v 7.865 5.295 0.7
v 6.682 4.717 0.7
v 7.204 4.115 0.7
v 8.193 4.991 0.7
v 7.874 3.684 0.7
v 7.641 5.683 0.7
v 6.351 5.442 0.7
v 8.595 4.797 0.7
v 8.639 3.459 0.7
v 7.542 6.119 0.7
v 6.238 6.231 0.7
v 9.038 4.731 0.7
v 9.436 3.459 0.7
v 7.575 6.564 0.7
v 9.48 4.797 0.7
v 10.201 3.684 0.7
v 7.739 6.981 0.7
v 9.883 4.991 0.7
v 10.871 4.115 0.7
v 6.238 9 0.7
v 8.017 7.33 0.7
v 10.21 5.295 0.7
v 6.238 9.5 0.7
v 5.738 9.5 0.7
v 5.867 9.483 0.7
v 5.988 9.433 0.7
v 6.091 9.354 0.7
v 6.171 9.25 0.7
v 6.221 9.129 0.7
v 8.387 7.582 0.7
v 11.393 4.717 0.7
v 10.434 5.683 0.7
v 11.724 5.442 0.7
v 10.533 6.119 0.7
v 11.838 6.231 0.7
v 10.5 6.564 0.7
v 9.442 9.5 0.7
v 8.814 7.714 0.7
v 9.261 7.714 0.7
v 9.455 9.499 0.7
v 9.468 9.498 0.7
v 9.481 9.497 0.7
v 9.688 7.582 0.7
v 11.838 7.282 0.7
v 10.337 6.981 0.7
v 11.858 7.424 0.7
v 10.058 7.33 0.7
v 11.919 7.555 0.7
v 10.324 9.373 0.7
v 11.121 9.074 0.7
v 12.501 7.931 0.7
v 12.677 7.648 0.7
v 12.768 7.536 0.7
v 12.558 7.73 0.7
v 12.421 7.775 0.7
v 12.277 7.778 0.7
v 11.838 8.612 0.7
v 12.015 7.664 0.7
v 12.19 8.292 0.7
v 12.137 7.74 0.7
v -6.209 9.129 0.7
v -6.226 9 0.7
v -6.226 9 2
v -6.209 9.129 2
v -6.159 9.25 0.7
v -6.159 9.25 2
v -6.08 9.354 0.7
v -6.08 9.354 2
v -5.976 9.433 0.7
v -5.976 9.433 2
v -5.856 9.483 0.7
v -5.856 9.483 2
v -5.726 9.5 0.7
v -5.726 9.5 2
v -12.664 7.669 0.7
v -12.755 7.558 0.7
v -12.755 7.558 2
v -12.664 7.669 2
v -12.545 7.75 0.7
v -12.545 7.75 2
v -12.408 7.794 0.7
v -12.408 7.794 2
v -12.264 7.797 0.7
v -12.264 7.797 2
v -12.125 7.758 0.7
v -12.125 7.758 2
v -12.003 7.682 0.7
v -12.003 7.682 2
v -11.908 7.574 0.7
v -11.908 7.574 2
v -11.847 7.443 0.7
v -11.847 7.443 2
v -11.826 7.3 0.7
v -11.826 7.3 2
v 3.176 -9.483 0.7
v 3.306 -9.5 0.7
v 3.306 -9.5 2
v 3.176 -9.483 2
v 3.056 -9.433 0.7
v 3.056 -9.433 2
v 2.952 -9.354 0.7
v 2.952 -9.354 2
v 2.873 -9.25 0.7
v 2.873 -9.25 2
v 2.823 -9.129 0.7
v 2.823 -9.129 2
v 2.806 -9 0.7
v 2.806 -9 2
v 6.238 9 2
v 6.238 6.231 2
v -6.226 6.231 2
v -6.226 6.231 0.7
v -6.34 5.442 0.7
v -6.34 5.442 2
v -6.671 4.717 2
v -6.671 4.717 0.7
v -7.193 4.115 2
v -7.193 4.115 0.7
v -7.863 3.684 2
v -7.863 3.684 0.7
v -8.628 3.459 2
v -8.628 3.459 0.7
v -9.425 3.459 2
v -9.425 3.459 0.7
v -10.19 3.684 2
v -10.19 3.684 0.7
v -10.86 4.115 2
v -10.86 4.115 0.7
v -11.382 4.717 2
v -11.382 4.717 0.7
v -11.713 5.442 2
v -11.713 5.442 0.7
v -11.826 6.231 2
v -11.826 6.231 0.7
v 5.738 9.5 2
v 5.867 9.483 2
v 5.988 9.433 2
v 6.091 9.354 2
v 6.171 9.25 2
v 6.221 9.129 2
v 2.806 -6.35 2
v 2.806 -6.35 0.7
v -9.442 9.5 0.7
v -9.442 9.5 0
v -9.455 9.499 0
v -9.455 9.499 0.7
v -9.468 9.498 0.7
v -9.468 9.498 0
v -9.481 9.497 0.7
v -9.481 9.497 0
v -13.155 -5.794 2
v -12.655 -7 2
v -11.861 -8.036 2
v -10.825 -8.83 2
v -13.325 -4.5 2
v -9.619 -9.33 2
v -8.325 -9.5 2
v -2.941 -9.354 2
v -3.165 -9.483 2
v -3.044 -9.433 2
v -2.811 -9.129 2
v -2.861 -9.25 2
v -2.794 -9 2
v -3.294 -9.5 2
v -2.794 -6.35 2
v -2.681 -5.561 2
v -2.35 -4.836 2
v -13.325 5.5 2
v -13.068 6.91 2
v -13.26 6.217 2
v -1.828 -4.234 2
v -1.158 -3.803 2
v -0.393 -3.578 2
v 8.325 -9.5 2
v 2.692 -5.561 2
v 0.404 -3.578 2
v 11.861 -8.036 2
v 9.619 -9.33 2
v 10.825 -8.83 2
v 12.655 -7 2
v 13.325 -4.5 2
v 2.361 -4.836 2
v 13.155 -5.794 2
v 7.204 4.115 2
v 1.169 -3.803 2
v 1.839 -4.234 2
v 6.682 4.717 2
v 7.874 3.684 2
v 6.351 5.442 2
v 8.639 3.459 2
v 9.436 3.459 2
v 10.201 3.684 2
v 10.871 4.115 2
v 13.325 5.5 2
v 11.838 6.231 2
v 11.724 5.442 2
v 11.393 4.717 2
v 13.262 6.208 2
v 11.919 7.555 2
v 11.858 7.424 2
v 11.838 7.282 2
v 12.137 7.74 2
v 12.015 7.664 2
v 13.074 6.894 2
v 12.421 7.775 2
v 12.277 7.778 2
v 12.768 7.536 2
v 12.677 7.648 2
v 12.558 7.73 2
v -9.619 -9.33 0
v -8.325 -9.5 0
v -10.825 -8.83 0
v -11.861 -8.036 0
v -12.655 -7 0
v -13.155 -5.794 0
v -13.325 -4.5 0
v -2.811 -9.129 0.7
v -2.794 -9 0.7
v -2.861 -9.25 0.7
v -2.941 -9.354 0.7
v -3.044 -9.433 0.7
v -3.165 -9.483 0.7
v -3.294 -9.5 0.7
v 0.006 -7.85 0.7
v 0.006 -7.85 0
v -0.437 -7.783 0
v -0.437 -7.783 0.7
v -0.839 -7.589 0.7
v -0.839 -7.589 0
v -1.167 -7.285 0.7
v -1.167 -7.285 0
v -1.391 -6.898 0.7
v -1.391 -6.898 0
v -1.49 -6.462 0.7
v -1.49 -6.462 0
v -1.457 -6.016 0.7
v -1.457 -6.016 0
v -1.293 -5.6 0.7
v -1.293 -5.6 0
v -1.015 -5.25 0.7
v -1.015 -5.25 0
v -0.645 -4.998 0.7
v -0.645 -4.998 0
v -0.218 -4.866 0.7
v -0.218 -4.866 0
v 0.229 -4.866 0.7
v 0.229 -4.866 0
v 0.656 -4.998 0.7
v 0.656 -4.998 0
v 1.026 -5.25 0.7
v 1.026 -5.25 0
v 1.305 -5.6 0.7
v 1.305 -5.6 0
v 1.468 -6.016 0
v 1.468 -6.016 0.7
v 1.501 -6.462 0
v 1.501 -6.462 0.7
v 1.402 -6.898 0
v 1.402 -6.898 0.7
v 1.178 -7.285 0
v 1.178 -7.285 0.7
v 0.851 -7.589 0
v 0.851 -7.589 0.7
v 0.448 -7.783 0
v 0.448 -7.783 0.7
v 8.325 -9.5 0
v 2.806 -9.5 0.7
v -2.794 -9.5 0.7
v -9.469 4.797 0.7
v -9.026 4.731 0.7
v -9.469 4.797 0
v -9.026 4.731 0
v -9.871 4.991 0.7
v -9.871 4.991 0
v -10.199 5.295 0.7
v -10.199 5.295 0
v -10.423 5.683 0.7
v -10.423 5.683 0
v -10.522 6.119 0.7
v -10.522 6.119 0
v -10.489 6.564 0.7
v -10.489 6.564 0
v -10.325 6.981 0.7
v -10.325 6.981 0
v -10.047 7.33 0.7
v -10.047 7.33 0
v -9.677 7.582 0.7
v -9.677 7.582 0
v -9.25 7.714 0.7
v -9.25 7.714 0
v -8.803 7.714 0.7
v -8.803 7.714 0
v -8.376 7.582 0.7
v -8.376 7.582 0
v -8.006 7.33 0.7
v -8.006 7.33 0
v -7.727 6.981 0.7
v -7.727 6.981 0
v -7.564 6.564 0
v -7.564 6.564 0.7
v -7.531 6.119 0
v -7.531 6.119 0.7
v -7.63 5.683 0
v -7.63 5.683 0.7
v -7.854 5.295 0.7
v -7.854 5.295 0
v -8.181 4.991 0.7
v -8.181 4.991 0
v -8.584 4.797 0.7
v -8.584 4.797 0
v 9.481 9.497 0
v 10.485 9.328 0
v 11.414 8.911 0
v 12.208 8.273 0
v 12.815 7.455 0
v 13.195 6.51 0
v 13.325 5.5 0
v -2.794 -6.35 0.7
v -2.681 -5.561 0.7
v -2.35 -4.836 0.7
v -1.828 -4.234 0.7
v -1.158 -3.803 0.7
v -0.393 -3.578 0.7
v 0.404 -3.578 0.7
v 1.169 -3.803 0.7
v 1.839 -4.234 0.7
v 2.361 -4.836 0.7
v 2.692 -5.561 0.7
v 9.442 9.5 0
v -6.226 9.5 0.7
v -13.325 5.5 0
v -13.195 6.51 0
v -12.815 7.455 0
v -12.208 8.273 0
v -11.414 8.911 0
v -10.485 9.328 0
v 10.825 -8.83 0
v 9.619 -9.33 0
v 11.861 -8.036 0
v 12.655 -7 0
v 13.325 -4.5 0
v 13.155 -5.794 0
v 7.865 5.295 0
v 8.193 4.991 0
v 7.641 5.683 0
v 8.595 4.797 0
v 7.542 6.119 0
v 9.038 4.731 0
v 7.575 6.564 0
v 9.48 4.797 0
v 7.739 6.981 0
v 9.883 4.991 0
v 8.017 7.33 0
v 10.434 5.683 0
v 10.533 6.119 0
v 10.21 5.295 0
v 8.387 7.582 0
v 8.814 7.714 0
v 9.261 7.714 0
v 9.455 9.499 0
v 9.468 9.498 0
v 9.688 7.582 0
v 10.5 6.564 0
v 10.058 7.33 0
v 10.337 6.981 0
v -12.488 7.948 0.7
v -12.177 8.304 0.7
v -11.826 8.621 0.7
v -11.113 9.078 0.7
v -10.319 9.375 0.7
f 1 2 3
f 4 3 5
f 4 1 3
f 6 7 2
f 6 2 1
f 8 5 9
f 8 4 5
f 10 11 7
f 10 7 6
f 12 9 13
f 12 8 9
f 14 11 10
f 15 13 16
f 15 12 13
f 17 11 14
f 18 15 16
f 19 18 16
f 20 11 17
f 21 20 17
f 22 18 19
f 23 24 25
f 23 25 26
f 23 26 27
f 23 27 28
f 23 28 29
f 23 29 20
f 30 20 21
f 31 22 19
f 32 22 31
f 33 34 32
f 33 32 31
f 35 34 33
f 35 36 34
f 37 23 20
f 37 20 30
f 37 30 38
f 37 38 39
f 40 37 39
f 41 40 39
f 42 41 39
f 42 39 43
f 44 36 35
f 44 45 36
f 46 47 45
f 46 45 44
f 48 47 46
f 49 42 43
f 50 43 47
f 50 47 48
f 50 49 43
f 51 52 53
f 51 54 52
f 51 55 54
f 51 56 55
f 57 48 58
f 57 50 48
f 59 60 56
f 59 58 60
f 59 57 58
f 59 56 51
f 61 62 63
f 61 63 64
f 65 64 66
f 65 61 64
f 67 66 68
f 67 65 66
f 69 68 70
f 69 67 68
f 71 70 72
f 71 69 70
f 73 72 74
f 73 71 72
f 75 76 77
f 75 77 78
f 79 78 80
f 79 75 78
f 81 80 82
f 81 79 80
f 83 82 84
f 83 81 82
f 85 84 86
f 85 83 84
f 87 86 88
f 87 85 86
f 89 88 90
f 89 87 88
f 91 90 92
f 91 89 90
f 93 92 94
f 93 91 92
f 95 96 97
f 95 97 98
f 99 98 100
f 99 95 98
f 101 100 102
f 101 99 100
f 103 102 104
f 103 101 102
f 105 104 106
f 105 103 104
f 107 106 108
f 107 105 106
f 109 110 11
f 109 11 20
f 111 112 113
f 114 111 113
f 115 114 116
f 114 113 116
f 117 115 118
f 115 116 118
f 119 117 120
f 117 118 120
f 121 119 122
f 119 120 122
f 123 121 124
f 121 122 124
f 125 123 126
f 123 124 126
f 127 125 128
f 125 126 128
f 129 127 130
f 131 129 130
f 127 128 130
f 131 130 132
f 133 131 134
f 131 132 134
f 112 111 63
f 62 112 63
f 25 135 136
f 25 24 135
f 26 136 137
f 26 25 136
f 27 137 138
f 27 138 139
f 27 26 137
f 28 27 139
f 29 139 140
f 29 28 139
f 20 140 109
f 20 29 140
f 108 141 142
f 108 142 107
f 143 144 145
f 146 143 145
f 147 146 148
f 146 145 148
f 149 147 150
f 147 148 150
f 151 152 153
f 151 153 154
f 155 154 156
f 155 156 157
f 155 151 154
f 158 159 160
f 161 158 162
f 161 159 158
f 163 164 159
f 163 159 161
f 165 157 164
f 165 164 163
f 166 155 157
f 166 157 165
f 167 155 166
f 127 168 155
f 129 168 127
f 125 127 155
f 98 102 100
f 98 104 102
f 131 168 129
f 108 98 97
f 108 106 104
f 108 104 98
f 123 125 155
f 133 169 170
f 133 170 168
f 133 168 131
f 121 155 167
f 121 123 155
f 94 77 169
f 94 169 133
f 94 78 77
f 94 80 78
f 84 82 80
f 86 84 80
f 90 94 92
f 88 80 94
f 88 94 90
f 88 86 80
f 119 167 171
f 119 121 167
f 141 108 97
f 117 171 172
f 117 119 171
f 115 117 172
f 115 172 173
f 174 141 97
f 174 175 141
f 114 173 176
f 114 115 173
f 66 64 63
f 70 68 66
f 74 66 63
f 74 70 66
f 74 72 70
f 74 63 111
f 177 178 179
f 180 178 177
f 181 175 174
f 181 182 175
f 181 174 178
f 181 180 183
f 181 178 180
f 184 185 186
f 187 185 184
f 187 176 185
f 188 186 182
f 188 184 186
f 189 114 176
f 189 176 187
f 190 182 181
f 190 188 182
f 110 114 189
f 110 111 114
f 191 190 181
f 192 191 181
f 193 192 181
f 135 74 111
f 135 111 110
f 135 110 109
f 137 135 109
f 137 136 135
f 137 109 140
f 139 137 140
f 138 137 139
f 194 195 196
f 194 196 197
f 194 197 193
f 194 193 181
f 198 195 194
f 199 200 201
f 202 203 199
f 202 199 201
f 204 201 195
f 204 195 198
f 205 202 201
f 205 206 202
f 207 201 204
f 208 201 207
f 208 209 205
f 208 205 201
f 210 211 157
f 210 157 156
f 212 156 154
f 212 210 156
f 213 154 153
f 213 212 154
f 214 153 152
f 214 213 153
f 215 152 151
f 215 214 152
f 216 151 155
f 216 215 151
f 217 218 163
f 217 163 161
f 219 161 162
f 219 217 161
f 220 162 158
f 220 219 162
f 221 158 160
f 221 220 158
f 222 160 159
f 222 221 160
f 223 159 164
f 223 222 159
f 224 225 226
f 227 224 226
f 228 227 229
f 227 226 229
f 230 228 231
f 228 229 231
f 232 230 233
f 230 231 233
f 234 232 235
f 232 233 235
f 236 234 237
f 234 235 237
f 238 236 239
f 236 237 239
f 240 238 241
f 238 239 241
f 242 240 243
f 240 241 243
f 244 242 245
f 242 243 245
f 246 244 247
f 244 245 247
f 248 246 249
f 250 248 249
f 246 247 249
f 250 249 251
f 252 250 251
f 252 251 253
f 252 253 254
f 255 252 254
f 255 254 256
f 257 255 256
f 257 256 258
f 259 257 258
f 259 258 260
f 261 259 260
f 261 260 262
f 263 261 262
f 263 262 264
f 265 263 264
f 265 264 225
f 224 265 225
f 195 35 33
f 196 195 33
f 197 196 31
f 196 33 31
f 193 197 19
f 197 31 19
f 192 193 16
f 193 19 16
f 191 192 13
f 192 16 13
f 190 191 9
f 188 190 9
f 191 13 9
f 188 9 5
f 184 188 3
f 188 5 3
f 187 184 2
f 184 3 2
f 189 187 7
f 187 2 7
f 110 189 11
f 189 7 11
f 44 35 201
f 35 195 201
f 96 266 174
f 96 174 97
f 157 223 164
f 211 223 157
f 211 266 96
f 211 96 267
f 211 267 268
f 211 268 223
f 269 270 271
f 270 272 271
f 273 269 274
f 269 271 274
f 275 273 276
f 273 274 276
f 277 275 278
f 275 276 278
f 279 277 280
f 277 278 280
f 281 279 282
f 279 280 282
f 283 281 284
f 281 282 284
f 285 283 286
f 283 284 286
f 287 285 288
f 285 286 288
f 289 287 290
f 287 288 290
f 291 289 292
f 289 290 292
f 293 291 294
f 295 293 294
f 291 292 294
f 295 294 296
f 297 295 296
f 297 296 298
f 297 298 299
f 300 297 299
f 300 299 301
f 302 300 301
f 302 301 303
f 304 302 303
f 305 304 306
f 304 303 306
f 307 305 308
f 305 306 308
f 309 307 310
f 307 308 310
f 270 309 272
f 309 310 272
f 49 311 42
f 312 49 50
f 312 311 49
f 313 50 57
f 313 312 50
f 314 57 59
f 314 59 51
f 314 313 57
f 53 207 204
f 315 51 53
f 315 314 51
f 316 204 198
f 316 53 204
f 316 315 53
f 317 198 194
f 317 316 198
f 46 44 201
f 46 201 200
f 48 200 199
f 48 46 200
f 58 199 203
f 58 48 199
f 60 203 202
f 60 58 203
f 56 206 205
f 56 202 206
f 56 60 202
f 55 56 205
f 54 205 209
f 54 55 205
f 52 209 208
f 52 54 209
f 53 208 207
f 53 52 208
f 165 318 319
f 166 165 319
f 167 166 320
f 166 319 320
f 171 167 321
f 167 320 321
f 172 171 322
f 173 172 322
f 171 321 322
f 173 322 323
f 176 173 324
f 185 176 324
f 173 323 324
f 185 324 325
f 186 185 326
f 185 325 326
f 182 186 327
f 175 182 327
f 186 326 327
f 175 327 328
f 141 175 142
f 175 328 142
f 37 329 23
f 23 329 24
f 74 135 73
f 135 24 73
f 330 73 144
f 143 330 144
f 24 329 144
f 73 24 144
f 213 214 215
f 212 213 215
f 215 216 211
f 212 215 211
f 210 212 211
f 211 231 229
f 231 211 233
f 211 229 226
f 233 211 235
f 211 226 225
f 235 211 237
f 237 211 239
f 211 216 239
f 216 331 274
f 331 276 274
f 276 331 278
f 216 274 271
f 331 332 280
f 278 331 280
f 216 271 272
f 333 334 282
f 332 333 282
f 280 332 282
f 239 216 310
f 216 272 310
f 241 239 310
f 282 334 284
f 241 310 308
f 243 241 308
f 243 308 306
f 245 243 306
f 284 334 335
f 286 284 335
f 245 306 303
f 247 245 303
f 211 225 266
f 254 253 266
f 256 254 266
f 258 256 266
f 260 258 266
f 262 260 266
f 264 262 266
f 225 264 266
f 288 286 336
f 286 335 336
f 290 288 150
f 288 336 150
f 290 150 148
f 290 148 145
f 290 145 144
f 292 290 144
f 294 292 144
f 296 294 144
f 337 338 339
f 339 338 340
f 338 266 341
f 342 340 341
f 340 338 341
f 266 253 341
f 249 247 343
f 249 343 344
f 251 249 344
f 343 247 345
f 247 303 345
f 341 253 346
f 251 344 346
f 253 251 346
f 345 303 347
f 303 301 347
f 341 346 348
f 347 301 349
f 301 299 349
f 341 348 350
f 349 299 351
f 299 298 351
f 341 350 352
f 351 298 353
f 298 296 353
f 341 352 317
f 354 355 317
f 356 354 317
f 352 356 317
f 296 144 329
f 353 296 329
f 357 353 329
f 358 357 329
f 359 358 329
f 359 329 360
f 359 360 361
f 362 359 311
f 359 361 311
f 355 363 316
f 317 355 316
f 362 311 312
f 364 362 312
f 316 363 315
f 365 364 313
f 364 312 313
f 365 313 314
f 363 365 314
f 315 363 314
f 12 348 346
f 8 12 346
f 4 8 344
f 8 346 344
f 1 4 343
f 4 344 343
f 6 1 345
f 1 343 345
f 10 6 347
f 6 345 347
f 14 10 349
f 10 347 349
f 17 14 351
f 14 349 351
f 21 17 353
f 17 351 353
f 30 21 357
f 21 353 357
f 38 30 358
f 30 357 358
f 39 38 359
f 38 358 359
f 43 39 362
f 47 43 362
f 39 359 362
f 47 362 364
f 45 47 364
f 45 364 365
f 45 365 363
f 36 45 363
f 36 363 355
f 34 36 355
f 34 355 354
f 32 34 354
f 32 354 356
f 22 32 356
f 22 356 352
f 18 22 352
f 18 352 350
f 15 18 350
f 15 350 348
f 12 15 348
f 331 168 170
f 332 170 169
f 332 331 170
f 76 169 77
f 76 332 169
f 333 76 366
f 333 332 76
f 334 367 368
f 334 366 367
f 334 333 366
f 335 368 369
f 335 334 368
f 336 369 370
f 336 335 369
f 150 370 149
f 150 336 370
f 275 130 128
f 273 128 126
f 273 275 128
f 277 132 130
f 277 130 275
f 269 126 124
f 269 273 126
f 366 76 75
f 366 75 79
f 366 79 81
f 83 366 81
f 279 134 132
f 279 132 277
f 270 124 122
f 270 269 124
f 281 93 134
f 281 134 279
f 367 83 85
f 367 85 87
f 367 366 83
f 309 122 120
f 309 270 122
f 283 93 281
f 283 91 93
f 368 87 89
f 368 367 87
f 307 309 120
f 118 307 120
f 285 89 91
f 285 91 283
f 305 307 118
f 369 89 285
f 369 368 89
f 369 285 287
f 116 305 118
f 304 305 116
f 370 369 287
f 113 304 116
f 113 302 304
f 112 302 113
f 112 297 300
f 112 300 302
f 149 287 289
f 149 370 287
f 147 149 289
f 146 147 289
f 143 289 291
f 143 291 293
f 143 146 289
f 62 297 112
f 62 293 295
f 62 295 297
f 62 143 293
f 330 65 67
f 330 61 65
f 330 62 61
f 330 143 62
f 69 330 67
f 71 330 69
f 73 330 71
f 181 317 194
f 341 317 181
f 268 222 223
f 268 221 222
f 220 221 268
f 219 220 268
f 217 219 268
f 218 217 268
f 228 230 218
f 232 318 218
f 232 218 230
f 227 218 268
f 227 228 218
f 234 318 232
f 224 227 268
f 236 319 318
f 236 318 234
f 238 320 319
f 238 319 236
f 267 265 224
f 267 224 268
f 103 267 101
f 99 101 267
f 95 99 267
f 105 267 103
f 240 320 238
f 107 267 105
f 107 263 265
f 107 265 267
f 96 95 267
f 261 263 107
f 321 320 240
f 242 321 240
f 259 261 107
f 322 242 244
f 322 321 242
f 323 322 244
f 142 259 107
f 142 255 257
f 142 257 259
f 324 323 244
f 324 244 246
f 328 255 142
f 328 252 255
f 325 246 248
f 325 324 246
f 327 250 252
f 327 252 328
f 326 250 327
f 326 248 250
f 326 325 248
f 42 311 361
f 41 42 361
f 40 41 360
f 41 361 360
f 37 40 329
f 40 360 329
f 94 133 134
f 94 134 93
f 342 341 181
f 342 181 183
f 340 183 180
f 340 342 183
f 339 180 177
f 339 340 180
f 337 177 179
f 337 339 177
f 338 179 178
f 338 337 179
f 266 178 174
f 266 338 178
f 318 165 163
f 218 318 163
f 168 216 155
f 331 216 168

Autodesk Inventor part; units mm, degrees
ref_plane "YZ Plane" through (0, 0, 0) normal (1, 0, 0) x (0, 1, 0)
ref_plane "XZ Plane" through (0, 0, 0) normal (0, 1, 0) x (-1, 0, 0)
ref_plane "XY Plane" through (0, 0, 0) normal (0, 0, 1) x (1, 0, 0)
sketch "Sketch1" plane through (0, 0, 0) normal (0, 0, 1) x (1, 0, 0)
  circle A0 centre (0.0056, -6.3497) radius 1 projected
  circle A1 centre (-9.0264, 6.2307) radius 1 projected
  circle A2 centre (9.0376, 6.2307) radius 1 projected
  line L0 (9.4418, 9.5) -> (-9.4418, 9.5) projected
  arc A3 (-9.4806, 9.497) -> (-9.4418, 9.5) centre (-9.5, 9.9966) ccw projected
  arc A4 (-9.4806, 9.497) -> (-13.325, 5.5) centre (-9.325, 5.5) ccw projected
  line L1 (-13.325, -4.5) -> (-13.325, 5.5) projected
  arc A5 (-13.325, -4.5) -> (-8.325, -9.5) centre (-8.325, -4.5) ccw projected
  line L2 (8.325, -9.5) -> (-8.325, -9.5) projected
  arc A6 (8.325, -9.5) -> (13.325, -4.5) centre (8.325, -4.5) ccw projected
  line L3 (13.325, 5.5) -> (13.325, -4.5) projected
  arc A7 (13.325, 5.5) -> (9.4806, 9.497) centre (9.325, 5.5) ccw projected
  arc A8 (9.4418, 9.5) -> (9.4806, 9.497) centre (9.5, 9.9966) ccw projected
  point P0 (0, 0)
extrude "Extrusion1" add sketch "Sketch1" along normal blind 2
sketch "Sketch2" plane through (0, 0, 2) normal (0, 0, -1) x (-1, 0, 0)
  circle A0 centre (9.0264, 6.2307) radius 1 projected
  circle A1 centre (-0.0056, -6.3497) radius 1 projected
  circle A2 centre (-9.0376, 6.2307) radius 1 projected
  point P0 (0, 0)
hole "Hole1" at (-9.0264, 6.2307, 2) at (0.0056, -6.3497, 2) at (9.0376, 6.2307, 2) direction (0, 0, -1) diameter 3 depth 10 counterbore diameter 5.6 counterbore depth 1.3
sketch "Sketch3" plane through (0, 0, 2) normal (0, 0, 1) x (1, 0, 0)
  circle A0 centre (9.0376, 6.2307) radius 2.8 projected
  circle A1 centre (0.0056, -6.3497) radius 2.8 projected
  circle A2 centre (-9.0264, 6.2307) radius 2.8 projected
  arc A3 (9.4418, 9.5) -> (9.4806, 9.497) centre (9.5, 9.9966) ccw projected
  line L0 (9.4418, 9.5) -> (-9.4418, 9.5) projected
  arc A4 (-9.4806, 9.497) -> (-9.4418, 9.5) centre (-9.5, 9.9966) ccw projected
  arc A5 (-9.4806, 9.497) -> (-13.325, 5.5) centre (-9.325, 5.5) ccw projected
  line L1 (-13.325, 5.5) -> (-13.325, -4.5) projected
  arc A6 (-13.325, -4.5) -> (-8.325, -9.5) centre (-8.325, -4.5) ccw projected
  line L2 (-8.325, -9.5) -> (8.325, -9.5) projected
  arc A7 (8.325, -9.5) -> (13.325, -4.5) centre (8.325, -4.5) ccw projected
  line L3 (13.325, -4.5) -> (13.325, 5.5) projected
  arc A8 (13.325, 5.5) -> (9.4806, 9.497) centre (9.325, 5.5) ccw projected
  line L4 (-6.2264, 6.2307) -> (-6.2264, 9.5)
  line L5 (-11.8264, 6.2307) -> (-11.8264, 8.6214)
  circle A9 centre (-9.0264, 6.2307) radius 2.8 projected
  line L6 (6.2376, 6.2307) -> (6.2376, 9.5)
  line L7 (11.8376, 6.2307) -> (11.8376, 8.6123)
  line L8 (2.8056, -6.3497) -> (2.8056, -9.5)
  line L9 (-2.7944, -6.3497) -> (-2.7944, -9.5)
  point P0 (0, 0)
extrude "Extrusion2" cut sketch "Sketch3" against normal up to surface (1.3 mm away) contours A0 L6 L0 A3 A8 L7 | L4 A2 L5 A5 A4 L0 | L2 L9 A1 L8
fillet "Fillet1" radius 0.5 6 edges at (-11.8264, 8.6214, 1.35) (-6.2264, 9.5, 1.35) (6.2376, 9.5, 1.35) (11.8376, 8.6123, 1.35) (-2.7944, -9.5, 1.35) (2.8056, -9.5, 1.35)
properties part number "LunasCover" material "Nylon 6/6"
